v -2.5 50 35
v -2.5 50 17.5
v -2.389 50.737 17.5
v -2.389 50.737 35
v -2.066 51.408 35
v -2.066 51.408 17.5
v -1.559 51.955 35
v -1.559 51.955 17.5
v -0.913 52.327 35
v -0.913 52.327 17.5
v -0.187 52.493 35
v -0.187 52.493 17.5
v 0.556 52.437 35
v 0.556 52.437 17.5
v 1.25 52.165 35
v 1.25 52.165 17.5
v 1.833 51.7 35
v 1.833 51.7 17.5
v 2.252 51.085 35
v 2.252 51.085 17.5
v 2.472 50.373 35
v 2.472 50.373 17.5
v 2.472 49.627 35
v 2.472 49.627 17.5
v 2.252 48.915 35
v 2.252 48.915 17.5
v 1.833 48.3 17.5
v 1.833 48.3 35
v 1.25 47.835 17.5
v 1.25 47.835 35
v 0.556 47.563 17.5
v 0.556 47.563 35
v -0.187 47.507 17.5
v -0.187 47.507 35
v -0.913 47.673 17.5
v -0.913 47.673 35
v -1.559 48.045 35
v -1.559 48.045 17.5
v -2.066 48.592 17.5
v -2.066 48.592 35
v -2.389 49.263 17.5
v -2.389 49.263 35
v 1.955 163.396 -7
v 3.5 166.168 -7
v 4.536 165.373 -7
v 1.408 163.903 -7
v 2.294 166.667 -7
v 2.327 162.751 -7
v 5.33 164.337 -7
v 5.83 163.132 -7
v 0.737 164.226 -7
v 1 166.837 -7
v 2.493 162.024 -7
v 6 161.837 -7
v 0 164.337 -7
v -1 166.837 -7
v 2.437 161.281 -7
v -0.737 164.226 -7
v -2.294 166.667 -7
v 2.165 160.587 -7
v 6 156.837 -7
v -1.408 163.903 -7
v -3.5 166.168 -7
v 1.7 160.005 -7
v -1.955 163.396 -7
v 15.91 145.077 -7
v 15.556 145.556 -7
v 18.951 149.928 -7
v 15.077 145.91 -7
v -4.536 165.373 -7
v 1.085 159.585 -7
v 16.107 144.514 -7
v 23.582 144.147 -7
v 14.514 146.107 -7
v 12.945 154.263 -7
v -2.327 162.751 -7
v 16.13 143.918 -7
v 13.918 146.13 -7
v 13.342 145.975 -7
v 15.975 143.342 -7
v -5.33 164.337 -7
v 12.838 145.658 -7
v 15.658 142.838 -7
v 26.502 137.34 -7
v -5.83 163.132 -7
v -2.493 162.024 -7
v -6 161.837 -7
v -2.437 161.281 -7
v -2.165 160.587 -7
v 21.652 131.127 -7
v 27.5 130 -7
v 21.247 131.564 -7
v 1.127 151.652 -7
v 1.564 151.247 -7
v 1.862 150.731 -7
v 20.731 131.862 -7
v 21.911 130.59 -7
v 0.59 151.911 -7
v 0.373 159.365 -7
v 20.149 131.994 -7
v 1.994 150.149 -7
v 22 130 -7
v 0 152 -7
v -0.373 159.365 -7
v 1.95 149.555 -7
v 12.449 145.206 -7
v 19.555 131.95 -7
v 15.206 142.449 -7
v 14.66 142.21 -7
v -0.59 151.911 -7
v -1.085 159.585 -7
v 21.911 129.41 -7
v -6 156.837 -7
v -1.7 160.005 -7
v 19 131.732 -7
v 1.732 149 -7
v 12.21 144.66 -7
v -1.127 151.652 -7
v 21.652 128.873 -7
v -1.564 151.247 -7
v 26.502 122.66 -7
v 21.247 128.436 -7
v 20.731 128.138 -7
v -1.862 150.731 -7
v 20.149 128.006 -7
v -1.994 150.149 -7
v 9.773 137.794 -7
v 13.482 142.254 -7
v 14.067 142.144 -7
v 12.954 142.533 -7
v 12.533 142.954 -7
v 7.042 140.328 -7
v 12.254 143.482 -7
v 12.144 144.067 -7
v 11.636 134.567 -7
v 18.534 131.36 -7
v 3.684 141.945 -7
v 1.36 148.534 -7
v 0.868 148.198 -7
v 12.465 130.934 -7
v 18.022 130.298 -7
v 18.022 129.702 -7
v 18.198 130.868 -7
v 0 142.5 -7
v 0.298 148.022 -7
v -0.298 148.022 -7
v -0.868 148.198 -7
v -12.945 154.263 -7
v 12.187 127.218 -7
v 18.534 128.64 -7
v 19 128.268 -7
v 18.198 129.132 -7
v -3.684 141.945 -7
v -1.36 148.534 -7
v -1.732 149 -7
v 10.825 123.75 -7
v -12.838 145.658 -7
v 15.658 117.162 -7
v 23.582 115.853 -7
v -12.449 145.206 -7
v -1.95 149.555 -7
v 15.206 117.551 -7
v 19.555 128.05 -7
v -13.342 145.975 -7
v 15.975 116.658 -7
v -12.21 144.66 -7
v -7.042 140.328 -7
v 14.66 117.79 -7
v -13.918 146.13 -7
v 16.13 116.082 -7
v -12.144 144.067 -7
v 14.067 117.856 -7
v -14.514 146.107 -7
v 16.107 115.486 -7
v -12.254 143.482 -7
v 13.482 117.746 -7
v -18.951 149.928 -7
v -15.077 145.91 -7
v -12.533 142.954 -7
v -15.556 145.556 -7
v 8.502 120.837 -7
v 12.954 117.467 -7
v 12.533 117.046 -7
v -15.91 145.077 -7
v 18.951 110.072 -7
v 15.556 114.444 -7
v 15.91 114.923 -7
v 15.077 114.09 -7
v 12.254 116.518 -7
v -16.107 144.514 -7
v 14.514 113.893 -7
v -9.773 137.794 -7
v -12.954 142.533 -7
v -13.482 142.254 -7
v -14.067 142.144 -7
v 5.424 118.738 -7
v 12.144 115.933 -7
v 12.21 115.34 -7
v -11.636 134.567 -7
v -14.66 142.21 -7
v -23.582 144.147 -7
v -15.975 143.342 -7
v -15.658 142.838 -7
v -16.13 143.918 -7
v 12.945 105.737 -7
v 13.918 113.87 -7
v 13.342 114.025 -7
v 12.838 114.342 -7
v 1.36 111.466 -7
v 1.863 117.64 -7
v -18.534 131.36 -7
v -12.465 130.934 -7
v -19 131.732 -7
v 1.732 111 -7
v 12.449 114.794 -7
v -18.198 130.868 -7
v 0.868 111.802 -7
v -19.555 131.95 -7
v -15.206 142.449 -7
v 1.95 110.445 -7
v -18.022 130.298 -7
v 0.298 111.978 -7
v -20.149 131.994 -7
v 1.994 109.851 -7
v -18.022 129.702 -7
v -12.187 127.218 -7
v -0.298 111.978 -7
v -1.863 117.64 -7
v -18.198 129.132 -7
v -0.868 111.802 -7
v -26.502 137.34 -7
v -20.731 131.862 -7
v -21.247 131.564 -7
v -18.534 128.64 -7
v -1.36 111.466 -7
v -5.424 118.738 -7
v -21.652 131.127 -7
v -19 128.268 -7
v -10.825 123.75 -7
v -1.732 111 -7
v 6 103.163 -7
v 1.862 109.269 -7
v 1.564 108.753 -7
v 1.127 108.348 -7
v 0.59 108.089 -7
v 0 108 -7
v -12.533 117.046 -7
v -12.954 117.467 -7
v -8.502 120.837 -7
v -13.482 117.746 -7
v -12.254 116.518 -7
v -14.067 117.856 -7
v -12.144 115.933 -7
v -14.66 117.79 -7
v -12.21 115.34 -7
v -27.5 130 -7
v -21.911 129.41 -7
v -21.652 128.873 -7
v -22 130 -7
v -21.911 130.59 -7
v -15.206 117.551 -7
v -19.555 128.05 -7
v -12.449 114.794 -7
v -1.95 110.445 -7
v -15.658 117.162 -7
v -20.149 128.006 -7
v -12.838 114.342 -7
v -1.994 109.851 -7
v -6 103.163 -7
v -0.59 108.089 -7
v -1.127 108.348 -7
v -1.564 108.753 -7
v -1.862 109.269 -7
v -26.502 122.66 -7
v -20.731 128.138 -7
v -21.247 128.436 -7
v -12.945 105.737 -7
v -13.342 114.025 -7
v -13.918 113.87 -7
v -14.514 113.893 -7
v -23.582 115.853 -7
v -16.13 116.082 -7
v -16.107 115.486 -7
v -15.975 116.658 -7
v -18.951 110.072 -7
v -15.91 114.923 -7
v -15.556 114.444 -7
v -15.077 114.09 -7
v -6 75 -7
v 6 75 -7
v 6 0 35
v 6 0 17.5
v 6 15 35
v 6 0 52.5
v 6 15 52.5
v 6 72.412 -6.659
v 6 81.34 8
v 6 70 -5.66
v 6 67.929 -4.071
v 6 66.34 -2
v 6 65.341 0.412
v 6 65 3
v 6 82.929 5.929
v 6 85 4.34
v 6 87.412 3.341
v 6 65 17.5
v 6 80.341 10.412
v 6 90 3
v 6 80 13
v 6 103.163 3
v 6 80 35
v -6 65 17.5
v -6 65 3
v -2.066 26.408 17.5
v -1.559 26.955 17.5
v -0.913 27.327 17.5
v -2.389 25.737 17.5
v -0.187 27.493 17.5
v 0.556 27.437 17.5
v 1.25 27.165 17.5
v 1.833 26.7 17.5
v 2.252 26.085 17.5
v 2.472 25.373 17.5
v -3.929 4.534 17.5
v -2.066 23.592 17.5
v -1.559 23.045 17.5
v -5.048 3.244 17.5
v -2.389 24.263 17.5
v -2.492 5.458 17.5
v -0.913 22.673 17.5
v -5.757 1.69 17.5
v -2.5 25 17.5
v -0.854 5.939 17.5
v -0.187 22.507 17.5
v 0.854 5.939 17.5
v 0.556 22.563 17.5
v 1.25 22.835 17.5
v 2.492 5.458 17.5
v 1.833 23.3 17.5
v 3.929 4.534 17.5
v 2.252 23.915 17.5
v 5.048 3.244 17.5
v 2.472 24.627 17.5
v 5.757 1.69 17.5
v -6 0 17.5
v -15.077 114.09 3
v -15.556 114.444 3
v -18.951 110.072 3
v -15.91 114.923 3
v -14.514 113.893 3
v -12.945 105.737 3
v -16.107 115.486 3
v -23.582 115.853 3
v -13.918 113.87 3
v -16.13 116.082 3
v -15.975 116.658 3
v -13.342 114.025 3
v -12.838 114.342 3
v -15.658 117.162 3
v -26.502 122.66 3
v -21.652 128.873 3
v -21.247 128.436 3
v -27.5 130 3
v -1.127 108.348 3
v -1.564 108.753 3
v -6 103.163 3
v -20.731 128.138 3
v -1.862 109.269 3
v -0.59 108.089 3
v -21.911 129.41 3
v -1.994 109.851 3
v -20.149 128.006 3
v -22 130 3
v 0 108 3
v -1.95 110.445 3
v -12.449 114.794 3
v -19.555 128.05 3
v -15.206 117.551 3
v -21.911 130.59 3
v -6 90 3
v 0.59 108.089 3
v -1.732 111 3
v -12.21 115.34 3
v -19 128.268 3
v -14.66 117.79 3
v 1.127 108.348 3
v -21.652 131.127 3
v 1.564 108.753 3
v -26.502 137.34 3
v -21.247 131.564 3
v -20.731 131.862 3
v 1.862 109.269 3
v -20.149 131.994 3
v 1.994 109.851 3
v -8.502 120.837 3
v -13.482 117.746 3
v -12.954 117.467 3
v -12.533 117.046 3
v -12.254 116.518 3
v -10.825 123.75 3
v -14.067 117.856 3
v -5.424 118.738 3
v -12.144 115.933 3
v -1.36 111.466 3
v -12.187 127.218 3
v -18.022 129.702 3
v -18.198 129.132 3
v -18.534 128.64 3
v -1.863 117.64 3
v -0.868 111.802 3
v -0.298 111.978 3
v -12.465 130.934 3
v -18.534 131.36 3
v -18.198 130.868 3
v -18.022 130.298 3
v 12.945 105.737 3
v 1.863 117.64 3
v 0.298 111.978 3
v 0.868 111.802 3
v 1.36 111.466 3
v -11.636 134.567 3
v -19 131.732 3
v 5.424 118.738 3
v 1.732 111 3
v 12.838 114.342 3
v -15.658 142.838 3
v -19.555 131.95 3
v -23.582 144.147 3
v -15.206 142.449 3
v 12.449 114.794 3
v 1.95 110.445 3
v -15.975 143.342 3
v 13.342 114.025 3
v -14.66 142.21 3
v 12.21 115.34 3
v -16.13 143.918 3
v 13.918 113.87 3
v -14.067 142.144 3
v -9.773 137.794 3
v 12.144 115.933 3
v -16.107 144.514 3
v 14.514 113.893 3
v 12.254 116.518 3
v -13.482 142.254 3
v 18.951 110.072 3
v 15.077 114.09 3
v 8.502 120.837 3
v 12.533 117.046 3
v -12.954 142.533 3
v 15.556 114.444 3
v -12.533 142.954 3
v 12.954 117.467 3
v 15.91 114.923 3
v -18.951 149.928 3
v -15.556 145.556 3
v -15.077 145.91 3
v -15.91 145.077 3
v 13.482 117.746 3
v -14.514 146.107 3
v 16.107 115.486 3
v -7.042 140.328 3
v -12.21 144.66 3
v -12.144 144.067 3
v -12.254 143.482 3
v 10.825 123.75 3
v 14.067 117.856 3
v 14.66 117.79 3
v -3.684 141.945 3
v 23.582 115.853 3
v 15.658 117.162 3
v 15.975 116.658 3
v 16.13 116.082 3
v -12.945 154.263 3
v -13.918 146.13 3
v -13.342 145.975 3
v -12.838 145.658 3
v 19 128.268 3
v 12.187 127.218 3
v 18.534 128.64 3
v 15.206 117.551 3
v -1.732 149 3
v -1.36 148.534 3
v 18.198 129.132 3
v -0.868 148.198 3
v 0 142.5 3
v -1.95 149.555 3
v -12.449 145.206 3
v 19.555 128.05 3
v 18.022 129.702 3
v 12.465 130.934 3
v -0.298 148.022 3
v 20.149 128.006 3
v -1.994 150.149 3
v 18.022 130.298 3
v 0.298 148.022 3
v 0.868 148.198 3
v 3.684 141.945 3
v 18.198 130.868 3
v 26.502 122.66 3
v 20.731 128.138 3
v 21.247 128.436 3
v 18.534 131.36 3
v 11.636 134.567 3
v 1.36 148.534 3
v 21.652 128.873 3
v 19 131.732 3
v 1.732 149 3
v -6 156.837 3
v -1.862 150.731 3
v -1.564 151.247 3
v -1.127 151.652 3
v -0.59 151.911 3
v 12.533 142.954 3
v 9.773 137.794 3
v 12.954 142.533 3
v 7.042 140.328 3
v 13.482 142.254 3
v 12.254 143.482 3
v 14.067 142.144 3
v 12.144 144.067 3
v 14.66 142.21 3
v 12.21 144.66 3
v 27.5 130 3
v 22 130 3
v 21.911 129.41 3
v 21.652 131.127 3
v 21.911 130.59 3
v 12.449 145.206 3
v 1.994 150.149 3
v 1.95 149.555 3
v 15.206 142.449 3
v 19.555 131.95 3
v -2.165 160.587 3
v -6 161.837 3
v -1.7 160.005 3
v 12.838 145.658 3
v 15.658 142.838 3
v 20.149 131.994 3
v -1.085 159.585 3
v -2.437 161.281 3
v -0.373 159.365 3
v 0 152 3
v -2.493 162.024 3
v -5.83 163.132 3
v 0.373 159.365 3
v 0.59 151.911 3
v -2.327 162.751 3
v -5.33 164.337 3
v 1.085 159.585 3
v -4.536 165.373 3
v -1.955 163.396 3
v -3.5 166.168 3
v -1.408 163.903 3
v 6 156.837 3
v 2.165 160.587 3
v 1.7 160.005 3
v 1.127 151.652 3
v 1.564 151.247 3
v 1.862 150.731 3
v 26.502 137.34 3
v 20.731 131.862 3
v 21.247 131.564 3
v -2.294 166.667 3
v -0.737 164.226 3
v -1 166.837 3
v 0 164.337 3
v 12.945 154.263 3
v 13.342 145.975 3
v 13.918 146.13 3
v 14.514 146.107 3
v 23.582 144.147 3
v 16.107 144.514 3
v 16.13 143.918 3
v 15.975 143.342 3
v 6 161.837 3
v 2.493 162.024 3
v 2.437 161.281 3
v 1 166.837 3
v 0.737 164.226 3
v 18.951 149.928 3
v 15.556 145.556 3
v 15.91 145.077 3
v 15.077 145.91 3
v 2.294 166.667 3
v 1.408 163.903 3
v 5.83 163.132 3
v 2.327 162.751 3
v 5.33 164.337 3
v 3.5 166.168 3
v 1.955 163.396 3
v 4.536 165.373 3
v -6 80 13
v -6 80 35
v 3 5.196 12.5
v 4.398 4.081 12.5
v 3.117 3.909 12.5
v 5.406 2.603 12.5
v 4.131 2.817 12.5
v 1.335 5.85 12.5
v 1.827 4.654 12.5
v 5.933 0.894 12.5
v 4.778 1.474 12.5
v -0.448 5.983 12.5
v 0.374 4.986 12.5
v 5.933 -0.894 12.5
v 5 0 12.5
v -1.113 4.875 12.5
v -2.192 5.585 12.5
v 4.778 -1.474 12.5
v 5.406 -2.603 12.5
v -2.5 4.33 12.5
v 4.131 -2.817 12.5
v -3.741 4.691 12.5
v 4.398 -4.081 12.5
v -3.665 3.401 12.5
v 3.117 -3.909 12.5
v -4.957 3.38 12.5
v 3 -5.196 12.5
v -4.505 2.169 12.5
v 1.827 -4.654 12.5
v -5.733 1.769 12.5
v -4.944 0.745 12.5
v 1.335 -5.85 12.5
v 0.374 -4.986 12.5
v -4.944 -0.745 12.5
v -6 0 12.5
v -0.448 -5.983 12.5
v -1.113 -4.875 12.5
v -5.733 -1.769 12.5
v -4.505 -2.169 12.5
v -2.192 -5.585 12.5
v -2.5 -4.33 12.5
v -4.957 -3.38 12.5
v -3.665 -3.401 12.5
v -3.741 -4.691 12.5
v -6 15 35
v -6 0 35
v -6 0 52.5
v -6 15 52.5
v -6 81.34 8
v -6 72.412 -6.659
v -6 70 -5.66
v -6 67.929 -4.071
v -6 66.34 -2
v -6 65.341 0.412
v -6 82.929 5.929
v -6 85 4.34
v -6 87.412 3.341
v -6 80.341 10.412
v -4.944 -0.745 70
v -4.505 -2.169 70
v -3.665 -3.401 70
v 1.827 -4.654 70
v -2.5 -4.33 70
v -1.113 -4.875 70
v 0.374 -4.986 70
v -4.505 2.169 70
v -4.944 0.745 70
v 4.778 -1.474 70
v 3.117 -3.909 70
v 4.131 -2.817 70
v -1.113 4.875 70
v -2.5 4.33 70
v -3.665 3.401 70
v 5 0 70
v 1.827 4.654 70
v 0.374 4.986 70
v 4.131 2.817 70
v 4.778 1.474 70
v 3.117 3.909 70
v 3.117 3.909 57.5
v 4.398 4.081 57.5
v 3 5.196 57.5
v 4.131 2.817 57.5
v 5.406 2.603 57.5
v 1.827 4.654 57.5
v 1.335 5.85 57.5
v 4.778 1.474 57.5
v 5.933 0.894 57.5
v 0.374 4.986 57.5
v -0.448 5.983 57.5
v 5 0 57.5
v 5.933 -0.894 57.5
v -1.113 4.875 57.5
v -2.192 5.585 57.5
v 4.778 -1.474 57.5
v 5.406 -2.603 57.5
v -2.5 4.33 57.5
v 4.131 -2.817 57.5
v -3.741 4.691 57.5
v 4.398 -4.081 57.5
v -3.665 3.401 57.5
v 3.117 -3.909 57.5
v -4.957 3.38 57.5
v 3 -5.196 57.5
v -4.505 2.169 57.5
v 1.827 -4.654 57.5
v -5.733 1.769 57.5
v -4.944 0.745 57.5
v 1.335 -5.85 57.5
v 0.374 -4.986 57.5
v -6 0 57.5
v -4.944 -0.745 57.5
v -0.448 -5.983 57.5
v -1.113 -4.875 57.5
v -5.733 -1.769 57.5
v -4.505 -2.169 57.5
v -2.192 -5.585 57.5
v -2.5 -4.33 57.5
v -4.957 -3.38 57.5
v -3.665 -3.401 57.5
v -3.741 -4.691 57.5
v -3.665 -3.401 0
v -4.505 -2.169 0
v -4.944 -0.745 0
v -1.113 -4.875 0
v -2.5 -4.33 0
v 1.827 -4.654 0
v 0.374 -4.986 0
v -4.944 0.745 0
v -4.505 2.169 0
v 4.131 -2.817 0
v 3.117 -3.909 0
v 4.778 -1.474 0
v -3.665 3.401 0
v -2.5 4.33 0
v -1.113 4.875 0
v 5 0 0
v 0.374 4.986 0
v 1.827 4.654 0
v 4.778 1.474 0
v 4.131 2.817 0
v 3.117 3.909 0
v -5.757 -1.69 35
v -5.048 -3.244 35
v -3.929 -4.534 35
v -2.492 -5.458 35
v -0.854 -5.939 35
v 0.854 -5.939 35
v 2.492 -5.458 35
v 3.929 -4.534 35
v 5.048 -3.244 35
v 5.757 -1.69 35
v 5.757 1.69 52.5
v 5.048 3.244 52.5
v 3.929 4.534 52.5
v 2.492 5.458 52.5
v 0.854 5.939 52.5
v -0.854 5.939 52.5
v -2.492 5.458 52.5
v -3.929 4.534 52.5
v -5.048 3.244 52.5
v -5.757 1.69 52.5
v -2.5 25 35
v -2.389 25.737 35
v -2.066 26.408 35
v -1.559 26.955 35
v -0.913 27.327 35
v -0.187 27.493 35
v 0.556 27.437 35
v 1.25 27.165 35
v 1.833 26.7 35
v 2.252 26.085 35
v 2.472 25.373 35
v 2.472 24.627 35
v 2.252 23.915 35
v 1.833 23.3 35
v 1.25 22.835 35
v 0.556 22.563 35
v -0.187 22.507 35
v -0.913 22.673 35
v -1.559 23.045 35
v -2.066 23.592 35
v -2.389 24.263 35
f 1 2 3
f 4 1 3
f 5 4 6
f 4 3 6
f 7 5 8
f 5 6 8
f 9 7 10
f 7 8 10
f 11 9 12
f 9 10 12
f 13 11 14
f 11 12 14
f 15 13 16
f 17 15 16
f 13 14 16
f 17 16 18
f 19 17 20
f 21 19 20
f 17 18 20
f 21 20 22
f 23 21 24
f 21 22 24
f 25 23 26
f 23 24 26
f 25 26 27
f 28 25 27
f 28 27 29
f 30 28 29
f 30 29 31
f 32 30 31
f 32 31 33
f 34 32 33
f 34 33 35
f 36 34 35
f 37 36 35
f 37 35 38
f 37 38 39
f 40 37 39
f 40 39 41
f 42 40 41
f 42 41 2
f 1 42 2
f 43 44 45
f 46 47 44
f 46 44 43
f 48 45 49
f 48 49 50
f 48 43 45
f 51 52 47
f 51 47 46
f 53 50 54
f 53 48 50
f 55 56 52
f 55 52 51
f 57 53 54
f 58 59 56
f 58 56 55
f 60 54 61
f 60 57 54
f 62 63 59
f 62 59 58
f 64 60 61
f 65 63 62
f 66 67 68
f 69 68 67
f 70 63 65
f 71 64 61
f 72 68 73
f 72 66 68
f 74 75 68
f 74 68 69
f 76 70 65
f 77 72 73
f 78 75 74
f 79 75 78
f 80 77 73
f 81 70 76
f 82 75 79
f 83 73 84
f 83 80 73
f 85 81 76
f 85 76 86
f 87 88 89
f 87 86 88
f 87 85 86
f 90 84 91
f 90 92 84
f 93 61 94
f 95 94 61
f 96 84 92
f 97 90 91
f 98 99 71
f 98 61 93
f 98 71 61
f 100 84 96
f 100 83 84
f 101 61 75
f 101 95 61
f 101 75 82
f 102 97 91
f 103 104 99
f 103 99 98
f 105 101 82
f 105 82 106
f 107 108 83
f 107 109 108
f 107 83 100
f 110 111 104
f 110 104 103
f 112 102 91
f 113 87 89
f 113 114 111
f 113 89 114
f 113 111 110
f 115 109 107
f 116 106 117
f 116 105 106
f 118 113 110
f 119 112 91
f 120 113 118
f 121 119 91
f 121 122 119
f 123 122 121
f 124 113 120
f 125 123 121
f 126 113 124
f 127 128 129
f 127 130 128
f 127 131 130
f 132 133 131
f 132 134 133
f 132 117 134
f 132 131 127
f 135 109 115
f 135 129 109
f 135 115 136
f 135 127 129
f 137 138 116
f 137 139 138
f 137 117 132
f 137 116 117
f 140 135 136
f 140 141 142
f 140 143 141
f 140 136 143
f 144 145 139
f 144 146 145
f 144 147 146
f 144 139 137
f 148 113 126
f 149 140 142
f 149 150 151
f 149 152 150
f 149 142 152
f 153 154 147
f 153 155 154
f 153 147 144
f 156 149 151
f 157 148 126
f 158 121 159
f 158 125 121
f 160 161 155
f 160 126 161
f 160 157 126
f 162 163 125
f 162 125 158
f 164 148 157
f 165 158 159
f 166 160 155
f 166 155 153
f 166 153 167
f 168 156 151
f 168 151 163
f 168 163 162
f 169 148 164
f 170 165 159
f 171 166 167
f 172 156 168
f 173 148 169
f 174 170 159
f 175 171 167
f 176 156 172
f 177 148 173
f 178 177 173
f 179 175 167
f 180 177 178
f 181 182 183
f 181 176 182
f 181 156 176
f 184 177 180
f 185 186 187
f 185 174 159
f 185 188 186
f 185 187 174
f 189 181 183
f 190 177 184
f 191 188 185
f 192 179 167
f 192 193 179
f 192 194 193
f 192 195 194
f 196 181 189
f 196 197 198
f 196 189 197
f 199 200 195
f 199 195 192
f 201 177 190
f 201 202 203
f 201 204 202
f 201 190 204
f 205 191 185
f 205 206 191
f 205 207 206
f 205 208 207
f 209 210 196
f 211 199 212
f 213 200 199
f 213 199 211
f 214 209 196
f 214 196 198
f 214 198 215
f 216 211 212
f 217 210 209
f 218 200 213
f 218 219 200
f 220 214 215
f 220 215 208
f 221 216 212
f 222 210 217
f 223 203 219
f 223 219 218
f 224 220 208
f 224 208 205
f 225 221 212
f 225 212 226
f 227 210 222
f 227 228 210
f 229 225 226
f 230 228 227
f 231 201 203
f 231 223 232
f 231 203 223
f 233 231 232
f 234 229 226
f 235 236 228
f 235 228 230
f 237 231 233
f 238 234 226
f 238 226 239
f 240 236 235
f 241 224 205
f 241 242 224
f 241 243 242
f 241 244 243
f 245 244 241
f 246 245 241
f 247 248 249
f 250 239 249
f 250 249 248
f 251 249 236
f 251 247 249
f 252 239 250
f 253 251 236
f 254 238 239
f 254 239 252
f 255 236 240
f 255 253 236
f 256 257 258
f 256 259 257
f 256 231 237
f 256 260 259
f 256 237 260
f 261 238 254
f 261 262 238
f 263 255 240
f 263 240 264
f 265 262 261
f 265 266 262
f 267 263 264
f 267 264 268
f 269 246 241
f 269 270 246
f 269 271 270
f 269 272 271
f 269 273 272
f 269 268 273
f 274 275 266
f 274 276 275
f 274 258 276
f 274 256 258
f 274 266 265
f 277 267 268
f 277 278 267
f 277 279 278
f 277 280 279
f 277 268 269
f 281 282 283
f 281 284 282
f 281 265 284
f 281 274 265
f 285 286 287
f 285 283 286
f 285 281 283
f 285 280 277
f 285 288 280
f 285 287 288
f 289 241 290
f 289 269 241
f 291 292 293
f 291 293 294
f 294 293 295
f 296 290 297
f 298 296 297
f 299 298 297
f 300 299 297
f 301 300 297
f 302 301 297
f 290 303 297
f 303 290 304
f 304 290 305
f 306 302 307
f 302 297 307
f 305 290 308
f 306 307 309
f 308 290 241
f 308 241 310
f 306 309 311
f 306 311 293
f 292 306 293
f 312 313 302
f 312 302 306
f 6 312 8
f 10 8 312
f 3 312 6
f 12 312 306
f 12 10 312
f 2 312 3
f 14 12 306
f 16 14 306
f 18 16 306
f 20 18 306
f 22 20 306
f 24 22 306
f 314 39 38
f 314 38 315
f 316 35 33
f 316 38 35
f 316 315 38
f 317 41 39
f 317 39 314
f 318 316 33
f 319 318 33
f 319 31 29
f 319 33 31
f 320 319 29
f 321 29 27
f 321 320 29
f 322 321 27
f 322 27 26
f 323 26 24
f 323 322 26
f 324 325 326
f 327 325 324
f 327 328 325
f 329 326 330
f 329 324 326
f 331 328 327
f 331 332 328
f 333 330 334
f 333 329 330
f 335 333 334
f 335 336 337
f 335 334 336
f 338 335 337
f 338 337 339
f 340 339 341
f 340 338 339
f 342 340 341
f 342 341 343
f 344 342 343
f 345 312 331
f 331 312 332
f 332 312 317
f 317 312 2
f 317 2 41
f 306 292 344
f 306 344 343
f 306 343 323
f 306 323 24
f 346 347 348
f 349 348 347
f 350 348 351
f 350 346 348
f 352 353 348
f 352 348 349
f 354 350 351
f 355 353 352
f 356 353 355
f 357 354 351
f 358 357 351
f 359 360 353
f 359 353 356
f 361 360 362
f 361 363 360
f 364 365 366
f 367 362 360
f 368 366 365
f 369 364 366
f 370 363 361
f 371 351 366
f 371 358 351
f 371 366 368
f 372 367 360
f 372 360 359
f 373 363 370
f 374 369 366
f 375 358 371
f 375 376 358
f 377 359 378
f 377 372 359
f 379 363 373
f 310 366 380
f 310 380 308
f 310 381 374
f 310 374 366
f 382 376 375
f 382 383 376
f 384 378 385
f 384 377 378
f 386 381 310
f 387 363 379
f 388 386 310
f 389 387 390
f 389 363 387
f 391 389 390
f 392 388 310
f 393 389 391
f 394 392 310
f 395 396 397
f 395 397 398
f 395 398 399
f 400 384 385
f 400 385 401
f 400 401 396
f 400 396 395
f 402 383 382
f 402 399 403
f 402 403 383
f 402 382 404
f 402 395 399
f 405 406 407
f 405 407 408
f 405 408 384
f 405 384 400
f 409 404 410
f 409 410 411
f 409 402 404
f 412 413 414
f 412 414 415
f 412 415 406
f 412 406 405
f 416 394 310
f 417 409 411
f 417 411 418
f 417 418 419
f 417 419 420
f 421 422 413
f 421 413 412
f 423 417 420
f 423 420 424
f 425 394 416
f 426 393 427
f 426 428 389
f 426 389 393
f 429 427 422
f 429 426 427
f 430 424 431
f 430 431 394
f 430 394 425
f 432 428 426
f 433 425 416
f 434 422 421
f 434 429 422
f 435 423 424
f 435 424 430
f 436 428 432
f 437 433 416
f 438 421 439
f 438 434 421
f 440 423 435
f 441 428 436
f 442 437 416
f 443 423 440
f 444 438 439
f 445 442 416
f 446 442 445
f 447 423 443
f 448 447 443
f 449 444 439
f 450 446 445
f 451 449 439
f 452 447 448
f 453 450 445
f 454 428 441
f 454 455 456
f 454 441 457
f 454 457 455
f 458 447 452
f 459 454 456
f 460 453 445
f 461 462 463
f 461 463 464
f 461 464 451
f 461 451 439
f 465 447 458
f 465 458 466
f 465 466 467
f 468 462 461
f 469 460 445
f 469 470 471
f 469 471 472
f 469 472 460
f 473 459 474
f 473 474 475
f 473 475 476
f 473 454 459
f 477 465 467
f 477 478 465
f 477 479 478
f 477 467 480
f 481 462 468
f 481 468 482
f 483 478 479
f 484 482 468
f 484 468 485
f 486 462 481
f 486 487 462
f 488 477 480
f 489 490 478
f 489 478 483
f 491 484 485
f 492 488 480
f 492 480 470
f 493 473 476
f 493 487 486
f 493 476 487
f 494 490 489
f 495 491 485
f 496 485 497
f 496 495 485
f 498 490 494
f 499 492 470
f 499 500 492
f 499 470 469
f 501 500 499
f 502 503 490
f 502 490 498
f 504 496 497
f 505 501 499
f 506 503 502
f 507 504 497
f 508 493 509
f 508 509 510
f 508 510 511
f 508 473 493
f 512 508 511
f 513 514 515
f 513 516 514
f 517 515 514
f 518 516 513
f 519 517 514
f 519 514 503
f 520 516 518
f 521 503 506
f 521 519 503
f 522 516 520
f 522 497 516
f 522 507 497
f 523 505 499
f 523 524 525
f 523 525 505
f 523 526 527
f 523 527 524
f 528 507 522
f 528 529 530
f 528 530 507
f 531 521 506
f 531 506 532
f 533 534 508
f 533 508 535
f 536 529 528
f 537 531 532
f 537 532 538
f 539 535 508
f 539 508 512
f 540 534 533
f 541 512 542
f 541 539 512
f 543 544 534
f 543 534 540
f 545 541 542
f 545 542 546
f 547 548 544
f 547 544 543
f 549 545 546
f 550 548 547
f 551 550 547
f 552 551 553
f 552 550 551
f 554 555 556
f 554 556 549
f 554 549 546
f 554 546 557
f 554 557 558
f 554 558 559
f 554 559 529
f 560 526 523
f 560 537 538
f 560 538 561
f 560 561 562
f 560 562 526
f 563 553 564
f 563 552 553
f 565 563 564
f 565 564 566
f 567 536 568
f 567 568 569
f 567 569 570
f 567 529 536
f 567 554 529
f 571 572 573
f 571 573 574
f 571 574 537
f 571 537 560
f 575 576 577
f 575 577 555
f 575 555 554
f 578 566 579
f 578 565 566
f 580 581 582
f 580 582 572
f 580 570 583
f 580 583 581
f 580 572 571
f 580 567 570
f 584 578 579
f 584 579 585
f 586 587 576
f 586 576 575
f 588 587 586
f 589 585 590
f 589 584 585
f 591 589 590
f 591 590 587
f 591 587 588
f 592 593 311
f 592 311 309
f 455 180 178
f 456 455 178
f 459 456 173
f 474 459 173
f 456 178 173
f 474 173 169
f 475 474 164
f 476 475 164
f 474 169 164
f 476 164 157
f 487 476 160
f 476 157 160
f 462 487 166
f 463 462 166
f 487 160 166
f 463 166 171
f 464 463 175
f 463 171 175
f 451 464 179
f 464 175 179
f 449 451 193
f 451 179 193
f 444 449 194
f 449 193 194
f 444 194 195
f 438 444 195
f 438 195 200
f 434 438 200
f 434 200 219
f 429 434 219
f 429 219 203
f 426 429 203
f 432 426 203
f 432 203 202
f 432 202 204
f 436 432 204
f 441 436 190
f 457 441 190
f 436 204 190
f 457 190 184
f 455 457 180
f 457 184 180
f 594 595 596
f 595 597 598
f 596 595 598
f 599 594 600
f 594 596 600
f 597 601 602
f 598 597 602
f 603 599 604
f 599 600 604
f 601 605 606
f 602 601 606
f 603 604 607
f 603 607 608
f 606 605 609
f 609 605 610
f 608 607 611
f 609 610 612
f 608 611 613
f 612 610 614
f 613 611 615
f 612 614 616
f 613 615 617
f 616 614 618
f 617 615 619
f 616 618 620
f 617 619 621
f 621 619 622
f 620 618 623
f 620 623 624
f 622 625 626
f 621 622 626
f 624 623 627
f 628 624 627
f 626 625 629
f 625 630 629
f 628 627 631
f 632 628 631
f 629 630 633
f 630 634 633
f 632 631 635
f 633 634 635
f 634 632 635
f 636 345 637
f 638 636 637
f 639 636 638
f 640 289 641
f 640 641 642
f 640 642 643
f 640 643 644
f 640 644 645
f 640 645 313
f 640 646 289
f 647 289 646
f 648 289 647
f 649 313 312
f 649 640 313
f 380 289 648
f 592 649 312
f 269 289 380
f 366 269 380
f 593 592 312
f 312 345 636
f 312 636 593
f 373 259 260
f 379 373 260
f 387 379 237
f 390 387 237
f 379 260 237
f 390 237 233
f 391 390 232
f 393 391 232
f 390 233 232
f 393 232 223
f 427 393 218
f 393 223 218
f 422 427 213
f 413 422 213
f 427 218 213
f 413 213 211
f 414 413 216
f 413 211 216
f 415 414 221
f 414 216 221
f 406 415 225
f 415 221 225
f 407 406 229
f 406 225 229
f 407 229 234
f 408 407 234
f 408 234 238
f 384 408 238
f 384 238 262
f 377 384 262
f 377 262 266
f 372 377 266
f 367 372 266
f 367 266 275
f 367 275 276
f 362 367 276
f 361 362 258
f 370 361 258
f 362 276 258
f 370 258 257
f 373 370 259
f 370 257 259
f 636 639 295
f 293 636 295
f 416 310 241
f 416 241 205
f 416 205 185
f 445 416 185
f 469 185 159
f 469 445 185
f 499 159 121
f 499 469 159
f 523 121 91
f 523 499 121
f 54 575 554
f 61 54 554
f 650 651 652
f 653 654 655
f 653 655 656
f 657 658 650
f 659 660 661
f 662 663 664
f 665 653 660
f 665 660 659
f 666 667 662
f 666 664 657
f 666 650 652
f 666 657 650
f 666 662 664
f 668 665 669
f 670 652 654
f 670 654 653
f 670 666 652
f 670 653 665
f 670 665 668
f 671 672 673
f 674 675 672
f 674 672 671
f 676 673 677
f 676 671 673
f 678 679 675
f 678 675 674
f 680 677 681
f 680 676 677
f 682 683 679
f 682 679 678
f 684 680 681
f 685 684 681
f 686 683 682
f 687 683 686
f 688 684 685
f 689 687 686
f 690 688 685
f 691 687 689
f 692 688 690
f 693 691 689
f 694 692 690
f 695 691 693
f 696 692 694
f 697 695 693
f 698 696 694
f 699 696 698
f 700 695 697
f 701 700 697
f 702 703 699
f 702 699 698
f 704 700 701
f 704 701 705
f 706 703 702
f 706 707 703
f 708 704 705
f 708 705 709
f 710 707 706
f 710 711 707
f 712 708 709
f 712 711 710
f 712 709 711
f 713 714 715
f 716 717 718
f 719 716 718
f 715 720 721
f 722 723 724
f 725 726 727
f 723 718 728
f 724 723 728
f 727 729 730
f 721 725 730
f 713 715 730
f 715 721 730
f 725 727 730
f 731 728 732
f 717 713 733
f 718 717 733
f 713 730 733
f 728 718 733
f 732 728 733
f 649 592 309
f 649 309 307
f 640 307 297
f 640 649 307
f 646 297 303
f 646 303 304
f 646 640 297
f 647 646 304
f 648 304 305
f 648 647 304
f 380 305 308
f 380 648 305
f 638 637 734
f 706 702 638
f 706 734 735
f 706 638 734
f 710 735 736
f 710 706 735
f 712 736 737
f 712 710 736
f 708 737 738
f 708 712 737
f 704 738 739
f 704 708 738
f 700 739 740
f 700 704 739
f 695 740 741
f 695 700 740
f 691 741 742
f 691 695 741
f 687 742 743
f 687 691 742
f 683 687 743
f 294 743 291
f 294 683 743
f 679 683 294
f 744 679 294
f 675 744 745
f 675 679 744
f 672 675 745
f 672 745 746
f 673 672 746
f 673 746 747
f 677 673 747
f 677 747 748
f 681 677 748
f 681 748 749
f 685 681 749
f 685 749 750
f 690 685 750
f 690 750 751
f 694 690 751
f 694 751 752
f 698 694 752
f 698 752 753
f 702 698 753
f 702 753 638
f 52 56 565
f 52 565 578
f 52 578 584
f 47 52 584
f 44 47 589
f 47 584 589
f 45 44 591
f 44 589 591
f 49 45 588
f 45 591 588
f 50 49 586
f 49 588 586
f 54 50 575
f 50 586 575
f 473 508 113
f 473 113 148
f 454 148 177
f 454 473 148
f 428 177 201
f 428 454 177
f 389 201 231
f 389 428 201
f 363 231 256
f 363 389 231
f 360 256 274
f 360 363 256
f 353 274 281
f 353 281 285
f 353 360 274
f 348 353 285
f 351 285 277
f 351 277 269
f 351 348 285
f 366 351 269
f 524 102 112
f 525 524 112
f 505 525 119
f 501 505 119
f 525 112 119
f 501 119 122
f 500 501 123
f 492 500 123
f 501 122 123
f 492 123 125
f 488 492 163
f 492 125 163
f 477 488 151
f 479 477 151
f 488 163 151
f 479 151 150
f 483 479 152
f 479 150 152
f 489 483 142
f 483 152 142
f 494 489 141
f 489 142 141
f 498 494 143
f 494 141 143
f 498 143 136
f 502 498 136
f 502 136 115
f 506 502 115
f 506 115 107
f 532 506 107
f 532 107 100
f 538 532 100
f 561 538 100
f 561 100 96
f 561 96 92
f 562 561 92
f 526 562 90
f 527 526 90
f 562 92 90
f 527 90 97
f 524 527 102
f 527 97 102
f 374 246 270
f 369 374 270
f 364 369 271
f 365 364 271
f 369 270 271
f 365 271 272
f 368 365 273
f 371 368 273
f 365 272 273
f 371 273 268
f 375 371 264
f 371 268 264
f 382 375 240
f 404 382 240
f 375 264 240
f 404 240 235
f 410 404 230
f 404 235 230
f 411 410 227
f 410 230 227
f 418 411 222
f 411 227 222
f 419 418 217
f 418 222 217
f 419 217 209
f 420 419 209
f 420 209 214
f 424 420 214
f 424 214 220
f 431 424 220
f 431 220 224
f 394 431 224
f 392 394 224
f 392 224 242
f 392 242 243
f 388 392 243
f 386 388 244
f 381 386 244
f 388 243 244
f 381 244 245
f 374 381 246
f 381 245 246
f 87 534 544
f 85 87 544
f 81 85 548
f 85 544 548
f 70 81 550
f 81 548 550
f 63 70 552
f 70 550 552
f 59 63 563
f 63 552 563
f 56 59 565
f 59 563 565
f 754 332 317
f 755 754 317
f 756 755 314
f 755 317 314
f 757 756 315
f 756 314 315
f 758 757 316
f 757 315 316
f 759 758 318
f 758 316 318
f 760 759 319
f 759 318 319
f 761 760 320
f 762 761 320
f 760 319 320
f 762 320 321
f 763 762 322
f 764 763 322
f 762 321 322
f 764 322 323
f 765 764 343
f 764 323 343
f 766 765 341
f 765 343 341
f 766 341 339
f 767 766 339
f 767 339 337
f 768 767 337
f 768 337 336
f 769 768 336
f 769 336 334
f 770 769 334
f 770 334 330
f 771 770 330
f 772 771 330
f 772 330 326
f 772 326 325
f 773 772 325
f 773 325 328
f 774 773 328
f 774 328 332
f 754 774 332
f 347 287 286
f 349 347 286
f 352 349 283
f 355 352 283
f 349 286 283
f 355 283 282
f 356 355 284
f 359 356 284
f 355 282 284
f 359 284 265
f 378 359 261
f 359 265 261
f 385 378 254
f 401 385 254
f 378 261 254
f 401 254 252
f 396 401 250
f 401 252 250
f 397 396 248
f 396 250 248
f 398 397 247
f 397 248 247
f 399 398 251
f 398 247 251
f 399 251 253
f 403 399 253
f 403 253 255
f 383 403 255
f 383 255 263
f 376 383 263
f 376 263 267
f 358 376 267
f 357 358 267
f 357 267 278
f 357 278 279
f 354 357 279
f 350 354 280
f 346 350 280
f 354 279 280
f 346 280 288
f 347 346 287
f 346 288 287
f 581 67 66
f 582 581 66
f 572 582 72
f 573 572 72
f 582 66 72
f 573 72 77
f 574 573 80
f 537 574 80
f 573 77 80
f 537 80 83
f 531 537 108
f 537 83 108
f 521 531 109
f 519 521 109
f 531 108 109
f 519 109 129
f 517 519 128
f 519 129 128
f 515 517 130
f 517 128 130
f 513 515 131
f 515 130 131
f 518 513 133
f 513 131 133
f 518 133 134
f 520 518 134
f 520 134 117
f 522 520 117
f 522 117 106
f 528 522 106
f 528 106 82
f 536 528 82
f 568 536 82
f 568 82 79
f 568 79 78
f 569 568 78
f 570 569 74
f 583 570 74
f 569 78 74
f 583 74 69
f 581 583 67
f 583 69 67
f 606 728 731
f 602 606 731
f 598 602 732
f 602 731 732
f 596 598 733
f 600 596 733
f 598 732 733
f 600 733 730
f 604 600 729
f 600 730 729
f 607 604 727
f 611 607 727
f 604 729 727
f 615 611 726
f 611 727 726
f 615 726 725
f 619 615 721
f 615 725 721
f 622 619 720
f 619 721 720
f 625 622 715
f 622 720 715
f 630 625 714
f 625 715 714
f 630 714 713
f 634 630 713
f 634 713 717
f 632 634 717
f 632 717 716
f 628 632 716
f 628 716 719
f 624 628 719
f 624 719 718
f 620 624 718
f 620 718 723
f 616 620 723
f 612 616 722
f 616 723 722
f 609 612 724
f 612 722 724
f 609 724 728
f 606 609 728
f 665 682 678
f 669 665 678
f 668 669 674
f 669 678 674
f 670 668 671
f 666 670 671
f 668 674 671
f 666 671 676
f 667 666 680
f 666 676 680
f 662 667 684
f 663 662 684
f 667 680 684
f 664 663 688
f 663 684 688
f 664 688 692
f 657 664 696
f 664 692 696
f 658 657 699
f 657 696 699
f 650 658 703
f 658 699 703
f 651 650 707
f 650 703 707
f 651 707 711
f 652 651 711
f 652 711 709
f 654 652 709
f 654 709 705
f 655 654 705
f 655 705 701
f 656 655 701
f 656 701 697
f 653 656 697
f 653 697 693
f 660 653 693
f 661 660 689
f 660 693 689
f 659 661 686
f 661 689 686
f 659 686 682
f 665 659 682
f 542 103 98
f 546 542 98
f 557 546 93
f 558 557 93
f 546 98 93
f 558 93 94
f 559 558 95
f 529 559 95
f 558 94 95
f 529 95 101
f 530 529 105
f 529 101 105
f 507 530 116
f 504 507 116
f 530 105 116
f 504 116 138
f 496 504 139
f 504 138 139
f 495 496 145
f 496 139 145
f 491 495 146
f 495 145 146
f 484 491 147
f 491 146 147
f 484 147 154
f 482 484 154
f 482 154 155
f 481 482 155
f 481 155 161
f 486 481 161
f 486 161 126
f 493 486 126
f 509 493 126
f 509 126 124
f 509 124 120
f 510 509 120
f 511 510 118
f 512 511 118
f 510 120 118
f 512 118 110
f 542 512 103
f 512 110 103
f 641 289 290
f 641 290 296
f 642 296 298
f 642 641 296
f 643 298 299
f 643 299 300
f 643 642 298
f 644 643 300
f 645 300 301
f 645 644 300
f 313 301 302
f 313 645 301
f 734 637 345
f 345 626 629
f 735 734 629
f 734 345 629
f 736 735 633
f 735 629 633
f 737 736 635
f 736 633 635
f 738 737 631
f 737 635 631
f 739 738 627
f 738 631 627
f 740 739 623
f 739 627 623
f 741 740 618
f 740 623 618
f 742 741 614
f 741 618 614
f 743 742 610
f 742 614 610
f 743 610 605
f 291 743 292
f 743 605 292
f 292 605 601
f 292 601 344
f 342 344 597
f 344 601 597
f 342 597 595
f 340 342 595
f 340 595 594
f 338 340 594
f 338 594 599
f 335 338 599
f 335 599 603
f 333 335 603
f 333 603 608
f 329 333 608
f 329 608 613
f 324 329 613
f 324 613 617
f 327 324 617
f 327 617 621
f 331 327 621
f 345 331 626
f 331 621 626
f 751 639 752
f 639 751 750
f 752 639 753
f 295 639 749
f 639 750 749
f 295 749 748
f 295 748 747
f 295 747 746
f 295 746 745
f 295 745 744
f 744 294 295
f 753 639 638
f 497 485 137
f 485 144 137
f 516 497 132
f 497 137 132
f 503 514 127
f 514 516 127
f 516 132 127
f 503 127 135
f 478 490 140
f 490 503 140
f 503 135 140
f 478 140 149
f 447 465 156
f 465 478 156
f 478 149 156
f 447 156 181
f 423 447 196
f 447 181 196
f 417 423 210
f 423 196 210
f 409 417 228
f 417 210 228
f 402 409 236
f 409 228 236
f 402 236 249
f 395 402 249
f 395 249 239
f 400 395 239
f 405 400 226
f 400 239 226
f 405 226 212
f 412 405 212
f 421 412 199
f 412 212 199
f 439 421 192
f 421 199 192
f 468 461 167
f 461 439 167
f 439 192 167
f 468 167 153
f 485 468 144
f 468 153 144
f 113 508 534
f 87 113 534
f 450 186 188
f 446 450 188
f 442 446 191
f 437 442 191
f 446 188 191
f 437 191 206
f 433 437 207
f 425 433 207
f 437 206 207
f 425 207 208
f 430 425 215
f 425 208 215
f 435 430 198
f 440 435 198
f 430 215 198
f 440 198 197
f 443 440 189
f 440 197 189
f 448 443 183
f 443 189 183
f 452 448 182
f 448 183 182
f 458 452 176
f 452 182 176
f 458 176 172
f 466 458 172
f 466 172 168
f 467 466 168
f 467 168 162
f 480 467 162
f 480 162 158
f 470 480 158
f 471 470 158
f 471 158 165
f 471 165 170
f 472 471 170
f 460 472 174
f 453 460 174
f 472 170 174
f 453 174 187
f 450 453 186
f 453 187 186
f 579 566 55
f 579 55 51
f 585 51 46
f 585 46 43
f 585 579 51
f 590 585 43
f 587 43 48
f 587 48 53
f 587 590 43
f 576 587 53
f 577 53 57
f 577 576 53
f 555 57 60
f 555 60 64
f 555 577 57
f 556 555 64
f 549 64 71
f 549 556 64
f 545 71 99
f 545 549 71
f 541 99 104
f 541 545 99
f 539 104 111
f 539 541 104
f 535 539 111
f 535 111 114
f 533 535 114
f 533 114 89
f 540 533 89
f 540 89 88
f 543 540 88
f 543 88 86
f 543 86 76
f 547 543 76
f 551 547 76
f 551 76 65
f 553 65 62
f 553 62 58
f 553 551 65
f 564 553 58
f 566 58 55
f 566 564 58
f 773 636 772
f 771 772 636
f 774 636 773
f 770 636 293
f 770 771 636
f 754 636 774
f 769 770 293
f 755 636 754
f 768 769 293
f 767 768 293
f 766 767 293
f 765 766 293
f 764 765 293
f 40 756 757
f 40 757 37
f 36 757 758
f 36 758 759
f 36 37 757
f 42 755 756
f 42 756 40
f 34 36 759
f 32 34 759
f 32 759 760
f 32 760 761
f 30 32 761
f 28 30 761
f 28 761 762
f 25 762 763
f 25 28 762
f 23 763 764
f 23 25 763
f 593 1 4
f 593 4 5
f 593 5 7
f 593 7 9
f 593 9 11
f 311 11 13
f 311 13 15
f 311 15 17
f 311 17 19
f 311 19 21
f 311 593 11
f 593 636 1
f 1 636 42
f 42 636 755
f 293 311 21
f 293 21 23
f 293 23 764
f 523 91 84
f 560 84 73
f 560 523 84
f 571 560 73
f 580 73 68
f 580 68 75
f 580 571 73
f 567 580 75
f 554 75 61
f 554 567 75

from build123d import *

# Parameters (mm, degrees)
SKETCH_1_R               = 5
EXTRUDE_1_DEPTH          = 12.5
SKETCH_2_R               = 6
EXTRUDE_2_DEPTH          = 22.5
SKETCH_3_R               = 5
EXTRUDE_3_DEPTH          = 12.5
SKETCH_4_W               = 12
SKETCH_4_H               = 35
EXTRUDE_4_DEPTH          = 80
EXTRUDE_5_DEPTH          = 12
EXTRUDE_6_DEPTH          = 10
SKETCH_7_R               = 9.5
CUT_EXTRUDE_1_DEPTH      = 2
SKETCH_8_R               = 6
CUT_EXTRUDE_2_DEPTH      = 166.329973084
EXTRUDE_START            = -10
EXTRUDE_7_DEPTH          = 10
SKETCH_10_R              = 2.5
CUT_EXTRUDE_3_DEPTH      = 10
FILLET_1_R               = 5
FILLET_2_R               = 5
SKETCH_11_R              = 2.5
CUT_EXTRUDE_4_DEPTH      = 10
EXTRUDE_8_DEPTH          = 10
SKETCH_13_R              = 12.5
SKETCH_13_R_2            = 2
CUT_EXTRUDE_5_DEPTH      = 10
PATTERN_CIRCULAR_1_COUNT = 8
SKETCH_14_R              = 2.5
EXTRUDE_9_DEPTH          = 10
SKETCH_15_R              = 2.5
CUT_EXTRUDE_6_DEPTH      = 35
CUT_EXTRUDE_7_DEPTH      = 175.719754648


with BuildPart() as part:
    # 草图1 → 凸台-拉伸1 (new body)
    with BuildSketch(Plane.XY):
        Circle(SKETCH_1_R)
    extrude(amount=EXTRUDE_1_DEPTH)

    # 草图2 → 凸台-拉伸2 (add)
    with BuildSketch(Plane.XY.offset(12.5)):
        with Locations(Location((0, 0, 0), (0, 0, 180))):
            Circle(SKETCH_2_R)
    extrude_2 = extrude(amount=EXTRUDE_2_DEPTH)

    # 镜向2: 凸台-拉伸2 across plane
    add(extrude_2.mirror(Plane.XY.offset(35)))

    # 草图3 → 凸台-拉伸3 (add)
    with BuildSketch(Plane.XY.offset(57.5)):
        Circle(SKETCH_3_R)
    extrude(amount=EXTRUDE_3_DEPTH)

    # 草图4 → 凸台-拉伸4 (add)
    with BuildSketch(Plane(origin=(0, 0, 0), x_dir=(1, 0, 0), z_dir=(0, 1, 0))):
        with Locations((0, -35)):
            Rectangle(SKETCH_4_W, SKETCH_4_H)
    extrude(amount=EXTRUDE_4_DEPTH)

    # 草图5 → 凸台-拉伸5 (add)
    with BuildSketch(Plane.ZY.offset(6)):
        with BuildLine():
            Line((17.5, 65), (17.5, 80))
            Line((17.5, 80), (13, 80))
            ThreePointArc((13, 80), (5.928932188, 82.928932188), (3, 90))
            Line((3, 90), (3, 130))
            Line((3, 130), (-7, 130))
            Line((-7, 130), (-7, 75))
            ThreePointArc((-7, 75), (-4.071067812, 67.928932188), (3, 65))
            Line((3, 65), (17.5, 65))
        make_face()
        with BuildLine():
            Line((59, 80), (52.5, 80))
            Line((52.5, 80), (52.5, 65))
            Line((52.5, 65), (69, 65))
            ThreePointArc((69, 65), (76.071067812, 67.928932188), (79, 75))
            Line((79, 75), (79, 130))
            Line((79, 130), (69, 130))
            Line((69, 130), (69, 90))
            ThreePointArc((69, 90), (66.071067812, 82.928932188), (59, 80))
        make_face()
    extrude(amount=-EXTRUDE_5_DEPTH)

    # 草图6 → 凸台-拉伸6 (add)
    with BuildSketch(Plane(origin=(0, 0, 69), x_dir=(-1, 0, 0), z_dir=(0, 0, -1))):
        with BuildLine():
            Line((6, 116.252272915), (6, 130))
            Line((6, 130), (-6, 130))
            Line((-6, 130), (-6, 116.252272915))
            ThreePointArc((-6, 116.252272915), (0, 115), (6, 116.252272915))
        make_face()
        with BuildLine():
            Line((-6, 130), (6, 130))
            Line((6, 130), (6, 116.252272915))
            ThreePointArc((6, 116.252272915), (12.549900398, 121.784161637), (15, 130))
            ThreePointArc((15, 130), (-8.215838363, 142.549900398), (-6, 116.252272915))
            Line((-6, 116.252272915), (-6, 130))
        make_face()
    extrude(amount=-EXTRUDE_6_DEPTH)

    # 草图7 → 切除-拉伸1 (cut)
    with BuildSketch(Plane(origin=(0, 0, 69), x_dir=(-1, 0, 0), z_dir=(0, 0, -1))):
        with Locations((0, 130)):
            Circle(SKETCH_7_R)
    extrude(amount=-CUT_EXTRUDE_1_DEPTH, mode=Mode.SUBTRACT)

    # 草图8 → 切除-拉伸2 (cut, through all)
    with BuildSketch(Plane(origin=(0, 0, 71), x_dir=(-1, 0, 0), z_dir=(0, 0, -1))):
        with Locations((0, 130)):
            Circle(SKETCH_8_R)
    extrude(amount=-CUT_EXTRUDE_2_DEPTH, mode=Mode.SUBTRACT)

    # 草图9 → 凸台-拉伸7 (add)
    with BuildSketch(Plane.XY.offset(79).offset(EXTRUDE_START)):
        with BuildLine():
            Line((-15, 155), (-15, 130))
            ThreePointArc((-15, 130), (0, 145), (15, 130))
            Line((15, 130), (15, 155))
            Line((15, 155), (-15, 155))
        make_face()
    extrude(amount=EXTRUDE_7_DEPTH)

    # 草图10 → 切除-拉伸3 (cut)
    with BuildSketch(Plane.XY.offset(79)):
        with Locations((10, 150)):
            Circle(SKETCH_10_R)
    extrude(amount=-CUT_EXTRUDE_3_DEPTH, mode=Mode.SUBTRACT)

    # 圆角1
    fillet_1_edges = [part.edges().sort_by_distance(p)[0] for p in [
        (15, 155, 74),
    ]]
    fillet(fillet_1_edges, radius=FILLET_1_R)

    # 圆角2
    fillet_2_edges = [part.edges().sort_by_distance(p)[0] for p in [
        (-15, 155, 74),
    ]]
    fillet(fillet_2_edges, radius=FILLET_2_R)

    # 草图11 → 切除-拉伸4 (cut)
    with BuildSketch(Plane.XY.offset(79)):
        with Locations((-10, 150)):
            Circle(SKETCH_11_R)
    extrude(amount=-CUT_EXTRUDE_4_DEPTH, mode=Mode.SUBTRACT)

    # 草图12 → 凸台-拉伸8 (add)
    with BuildSketch(Plane.XY.offset(3)):
        with BuildLine():
            ThreePointArc((-6, 103.162526199), (0, 102.5), (6, 103.162526199))
            Line((6, 103.162526199), (6, 130))
            Line((6, 130), (-6, 130))
            Line((-6, 130), (-6, 103.162526199))
        make_face()
        with BuildLine():
            Line((6, 130), (6, 103.162526199))
            ThreePointArc((6, 103.162526199), (21.462176031, 112.806251136), (27.5, 130))
            ThreePointArc((27.5, 130), (-17.193748864, 151.462176031), (-6, 103.162526199))
            Line((-6, 103.162526199), (-6, 130))
            Line((-6, 130), (6, 130))
        make_face()
    extrude(amount=-EXTRUDE_8_DEPTH)

    # 草图13 → 切除-拉伸5 (cut)
    with BuildSketch(Plane(origin=(0, 0, -7), x_dir=(-1, 0, 0), z_dir=(0, 0, -1))):
        with Locations(Location((0, 130, 0), (0, 0, 90))):
            Circle(SKETCH_13_R)
        with Locations(Location((0, 150, 0), (0, 0, 90))):
            Circle(SKETCH_13_R_2)
    cut_extrude_5 = extrude(amount=-CUT_EXTRUDE_5_DEPTH, mode=Mode.SUBTRACT)

    # 阵列(圆周)1: 切除-拉伸5 ×8 about axis
    pattern_circular_1_axis = Axis((0, 130, 0), (0, 0, 1))
    for i in range(1, PATTERN_CIRCULAR_1_COUNT):
        add(cut_extrude_5.rotate(pattern_circular_1_axis, i * 360 / PATTERN_CIRCULAR_1_COUNT), mode=Mode.SUBTRACT)

    # 草图14 → 凸台-拉伸9 (add)
    with BuildSketch(Plane(origin=(0, 0, -7), x_dir=(-1, 0, 0), z_dir=(0, 0, -1)).offset(EXTRUDE_START)):
        with BuildLine():
            Line((-6, 161.837473801), (-6, 156.837473801))
            ThreePointArc((-6, 156.837473801), (0, 157.5), (6, 156.837473801))
            Line((6, 156.837473801), (6, 161.837473801))
            ThreePointArc((6, 161.837473801), (4.535533906, 165.373007707), (1, 166.837473801))
            Line((1, 166.837473801), (-1, 166.837473801))
            ThreePointArc((-1, 166.837473801), (-4.535533906, 165.373007707), (-6, 161.837473801))
        make_face()
        with Locations(Location((0, 161.837473801, 0), (0, 0, 90))):
            Circle(SKETCH_14_R, mode=Mode.SUBTRACT)
    extrude(amount=EXTRUDE_9_DEPTH)

    # 草图15 → 切除-拉伸6 (cut)
    with BuildSketch(Plane(origin=(0, 0, 17.5), x_dir=(-1, 0, 0), z_dir=(0, 0, -1))):
        with Locations((0, 25)):
            Circle(SKETCH_15_R)
        with Locations((0, 50)):
            Circle(SKETCH_15_R)
    extrude(amount=-CUT_EXTRUDE_6_DEPTH, mode=Mode.SUBTRACT)

    # 草图16 → 切除-拉伸7 (cut, through all)
    with BuildSketch(Plane.XY.offset(35)):
        Polygon((-6, 97.653254631), (-6, 65), (-6, 15), (6, 15), (6, 65), (6, 97.653254631), align=None)
    extrude(amount=CUT_EXTRUDE_7_DEPTH, mode=Mode.SUBTRACT)


with BuildPart() as body_2:
    # of the pieces the cut leaves, the one that is kept (cut_extrude_7_keep)
    add(part.part.solids().sort_by_distance((-6, 0, 17.5))[0])


solid = body_2.part
